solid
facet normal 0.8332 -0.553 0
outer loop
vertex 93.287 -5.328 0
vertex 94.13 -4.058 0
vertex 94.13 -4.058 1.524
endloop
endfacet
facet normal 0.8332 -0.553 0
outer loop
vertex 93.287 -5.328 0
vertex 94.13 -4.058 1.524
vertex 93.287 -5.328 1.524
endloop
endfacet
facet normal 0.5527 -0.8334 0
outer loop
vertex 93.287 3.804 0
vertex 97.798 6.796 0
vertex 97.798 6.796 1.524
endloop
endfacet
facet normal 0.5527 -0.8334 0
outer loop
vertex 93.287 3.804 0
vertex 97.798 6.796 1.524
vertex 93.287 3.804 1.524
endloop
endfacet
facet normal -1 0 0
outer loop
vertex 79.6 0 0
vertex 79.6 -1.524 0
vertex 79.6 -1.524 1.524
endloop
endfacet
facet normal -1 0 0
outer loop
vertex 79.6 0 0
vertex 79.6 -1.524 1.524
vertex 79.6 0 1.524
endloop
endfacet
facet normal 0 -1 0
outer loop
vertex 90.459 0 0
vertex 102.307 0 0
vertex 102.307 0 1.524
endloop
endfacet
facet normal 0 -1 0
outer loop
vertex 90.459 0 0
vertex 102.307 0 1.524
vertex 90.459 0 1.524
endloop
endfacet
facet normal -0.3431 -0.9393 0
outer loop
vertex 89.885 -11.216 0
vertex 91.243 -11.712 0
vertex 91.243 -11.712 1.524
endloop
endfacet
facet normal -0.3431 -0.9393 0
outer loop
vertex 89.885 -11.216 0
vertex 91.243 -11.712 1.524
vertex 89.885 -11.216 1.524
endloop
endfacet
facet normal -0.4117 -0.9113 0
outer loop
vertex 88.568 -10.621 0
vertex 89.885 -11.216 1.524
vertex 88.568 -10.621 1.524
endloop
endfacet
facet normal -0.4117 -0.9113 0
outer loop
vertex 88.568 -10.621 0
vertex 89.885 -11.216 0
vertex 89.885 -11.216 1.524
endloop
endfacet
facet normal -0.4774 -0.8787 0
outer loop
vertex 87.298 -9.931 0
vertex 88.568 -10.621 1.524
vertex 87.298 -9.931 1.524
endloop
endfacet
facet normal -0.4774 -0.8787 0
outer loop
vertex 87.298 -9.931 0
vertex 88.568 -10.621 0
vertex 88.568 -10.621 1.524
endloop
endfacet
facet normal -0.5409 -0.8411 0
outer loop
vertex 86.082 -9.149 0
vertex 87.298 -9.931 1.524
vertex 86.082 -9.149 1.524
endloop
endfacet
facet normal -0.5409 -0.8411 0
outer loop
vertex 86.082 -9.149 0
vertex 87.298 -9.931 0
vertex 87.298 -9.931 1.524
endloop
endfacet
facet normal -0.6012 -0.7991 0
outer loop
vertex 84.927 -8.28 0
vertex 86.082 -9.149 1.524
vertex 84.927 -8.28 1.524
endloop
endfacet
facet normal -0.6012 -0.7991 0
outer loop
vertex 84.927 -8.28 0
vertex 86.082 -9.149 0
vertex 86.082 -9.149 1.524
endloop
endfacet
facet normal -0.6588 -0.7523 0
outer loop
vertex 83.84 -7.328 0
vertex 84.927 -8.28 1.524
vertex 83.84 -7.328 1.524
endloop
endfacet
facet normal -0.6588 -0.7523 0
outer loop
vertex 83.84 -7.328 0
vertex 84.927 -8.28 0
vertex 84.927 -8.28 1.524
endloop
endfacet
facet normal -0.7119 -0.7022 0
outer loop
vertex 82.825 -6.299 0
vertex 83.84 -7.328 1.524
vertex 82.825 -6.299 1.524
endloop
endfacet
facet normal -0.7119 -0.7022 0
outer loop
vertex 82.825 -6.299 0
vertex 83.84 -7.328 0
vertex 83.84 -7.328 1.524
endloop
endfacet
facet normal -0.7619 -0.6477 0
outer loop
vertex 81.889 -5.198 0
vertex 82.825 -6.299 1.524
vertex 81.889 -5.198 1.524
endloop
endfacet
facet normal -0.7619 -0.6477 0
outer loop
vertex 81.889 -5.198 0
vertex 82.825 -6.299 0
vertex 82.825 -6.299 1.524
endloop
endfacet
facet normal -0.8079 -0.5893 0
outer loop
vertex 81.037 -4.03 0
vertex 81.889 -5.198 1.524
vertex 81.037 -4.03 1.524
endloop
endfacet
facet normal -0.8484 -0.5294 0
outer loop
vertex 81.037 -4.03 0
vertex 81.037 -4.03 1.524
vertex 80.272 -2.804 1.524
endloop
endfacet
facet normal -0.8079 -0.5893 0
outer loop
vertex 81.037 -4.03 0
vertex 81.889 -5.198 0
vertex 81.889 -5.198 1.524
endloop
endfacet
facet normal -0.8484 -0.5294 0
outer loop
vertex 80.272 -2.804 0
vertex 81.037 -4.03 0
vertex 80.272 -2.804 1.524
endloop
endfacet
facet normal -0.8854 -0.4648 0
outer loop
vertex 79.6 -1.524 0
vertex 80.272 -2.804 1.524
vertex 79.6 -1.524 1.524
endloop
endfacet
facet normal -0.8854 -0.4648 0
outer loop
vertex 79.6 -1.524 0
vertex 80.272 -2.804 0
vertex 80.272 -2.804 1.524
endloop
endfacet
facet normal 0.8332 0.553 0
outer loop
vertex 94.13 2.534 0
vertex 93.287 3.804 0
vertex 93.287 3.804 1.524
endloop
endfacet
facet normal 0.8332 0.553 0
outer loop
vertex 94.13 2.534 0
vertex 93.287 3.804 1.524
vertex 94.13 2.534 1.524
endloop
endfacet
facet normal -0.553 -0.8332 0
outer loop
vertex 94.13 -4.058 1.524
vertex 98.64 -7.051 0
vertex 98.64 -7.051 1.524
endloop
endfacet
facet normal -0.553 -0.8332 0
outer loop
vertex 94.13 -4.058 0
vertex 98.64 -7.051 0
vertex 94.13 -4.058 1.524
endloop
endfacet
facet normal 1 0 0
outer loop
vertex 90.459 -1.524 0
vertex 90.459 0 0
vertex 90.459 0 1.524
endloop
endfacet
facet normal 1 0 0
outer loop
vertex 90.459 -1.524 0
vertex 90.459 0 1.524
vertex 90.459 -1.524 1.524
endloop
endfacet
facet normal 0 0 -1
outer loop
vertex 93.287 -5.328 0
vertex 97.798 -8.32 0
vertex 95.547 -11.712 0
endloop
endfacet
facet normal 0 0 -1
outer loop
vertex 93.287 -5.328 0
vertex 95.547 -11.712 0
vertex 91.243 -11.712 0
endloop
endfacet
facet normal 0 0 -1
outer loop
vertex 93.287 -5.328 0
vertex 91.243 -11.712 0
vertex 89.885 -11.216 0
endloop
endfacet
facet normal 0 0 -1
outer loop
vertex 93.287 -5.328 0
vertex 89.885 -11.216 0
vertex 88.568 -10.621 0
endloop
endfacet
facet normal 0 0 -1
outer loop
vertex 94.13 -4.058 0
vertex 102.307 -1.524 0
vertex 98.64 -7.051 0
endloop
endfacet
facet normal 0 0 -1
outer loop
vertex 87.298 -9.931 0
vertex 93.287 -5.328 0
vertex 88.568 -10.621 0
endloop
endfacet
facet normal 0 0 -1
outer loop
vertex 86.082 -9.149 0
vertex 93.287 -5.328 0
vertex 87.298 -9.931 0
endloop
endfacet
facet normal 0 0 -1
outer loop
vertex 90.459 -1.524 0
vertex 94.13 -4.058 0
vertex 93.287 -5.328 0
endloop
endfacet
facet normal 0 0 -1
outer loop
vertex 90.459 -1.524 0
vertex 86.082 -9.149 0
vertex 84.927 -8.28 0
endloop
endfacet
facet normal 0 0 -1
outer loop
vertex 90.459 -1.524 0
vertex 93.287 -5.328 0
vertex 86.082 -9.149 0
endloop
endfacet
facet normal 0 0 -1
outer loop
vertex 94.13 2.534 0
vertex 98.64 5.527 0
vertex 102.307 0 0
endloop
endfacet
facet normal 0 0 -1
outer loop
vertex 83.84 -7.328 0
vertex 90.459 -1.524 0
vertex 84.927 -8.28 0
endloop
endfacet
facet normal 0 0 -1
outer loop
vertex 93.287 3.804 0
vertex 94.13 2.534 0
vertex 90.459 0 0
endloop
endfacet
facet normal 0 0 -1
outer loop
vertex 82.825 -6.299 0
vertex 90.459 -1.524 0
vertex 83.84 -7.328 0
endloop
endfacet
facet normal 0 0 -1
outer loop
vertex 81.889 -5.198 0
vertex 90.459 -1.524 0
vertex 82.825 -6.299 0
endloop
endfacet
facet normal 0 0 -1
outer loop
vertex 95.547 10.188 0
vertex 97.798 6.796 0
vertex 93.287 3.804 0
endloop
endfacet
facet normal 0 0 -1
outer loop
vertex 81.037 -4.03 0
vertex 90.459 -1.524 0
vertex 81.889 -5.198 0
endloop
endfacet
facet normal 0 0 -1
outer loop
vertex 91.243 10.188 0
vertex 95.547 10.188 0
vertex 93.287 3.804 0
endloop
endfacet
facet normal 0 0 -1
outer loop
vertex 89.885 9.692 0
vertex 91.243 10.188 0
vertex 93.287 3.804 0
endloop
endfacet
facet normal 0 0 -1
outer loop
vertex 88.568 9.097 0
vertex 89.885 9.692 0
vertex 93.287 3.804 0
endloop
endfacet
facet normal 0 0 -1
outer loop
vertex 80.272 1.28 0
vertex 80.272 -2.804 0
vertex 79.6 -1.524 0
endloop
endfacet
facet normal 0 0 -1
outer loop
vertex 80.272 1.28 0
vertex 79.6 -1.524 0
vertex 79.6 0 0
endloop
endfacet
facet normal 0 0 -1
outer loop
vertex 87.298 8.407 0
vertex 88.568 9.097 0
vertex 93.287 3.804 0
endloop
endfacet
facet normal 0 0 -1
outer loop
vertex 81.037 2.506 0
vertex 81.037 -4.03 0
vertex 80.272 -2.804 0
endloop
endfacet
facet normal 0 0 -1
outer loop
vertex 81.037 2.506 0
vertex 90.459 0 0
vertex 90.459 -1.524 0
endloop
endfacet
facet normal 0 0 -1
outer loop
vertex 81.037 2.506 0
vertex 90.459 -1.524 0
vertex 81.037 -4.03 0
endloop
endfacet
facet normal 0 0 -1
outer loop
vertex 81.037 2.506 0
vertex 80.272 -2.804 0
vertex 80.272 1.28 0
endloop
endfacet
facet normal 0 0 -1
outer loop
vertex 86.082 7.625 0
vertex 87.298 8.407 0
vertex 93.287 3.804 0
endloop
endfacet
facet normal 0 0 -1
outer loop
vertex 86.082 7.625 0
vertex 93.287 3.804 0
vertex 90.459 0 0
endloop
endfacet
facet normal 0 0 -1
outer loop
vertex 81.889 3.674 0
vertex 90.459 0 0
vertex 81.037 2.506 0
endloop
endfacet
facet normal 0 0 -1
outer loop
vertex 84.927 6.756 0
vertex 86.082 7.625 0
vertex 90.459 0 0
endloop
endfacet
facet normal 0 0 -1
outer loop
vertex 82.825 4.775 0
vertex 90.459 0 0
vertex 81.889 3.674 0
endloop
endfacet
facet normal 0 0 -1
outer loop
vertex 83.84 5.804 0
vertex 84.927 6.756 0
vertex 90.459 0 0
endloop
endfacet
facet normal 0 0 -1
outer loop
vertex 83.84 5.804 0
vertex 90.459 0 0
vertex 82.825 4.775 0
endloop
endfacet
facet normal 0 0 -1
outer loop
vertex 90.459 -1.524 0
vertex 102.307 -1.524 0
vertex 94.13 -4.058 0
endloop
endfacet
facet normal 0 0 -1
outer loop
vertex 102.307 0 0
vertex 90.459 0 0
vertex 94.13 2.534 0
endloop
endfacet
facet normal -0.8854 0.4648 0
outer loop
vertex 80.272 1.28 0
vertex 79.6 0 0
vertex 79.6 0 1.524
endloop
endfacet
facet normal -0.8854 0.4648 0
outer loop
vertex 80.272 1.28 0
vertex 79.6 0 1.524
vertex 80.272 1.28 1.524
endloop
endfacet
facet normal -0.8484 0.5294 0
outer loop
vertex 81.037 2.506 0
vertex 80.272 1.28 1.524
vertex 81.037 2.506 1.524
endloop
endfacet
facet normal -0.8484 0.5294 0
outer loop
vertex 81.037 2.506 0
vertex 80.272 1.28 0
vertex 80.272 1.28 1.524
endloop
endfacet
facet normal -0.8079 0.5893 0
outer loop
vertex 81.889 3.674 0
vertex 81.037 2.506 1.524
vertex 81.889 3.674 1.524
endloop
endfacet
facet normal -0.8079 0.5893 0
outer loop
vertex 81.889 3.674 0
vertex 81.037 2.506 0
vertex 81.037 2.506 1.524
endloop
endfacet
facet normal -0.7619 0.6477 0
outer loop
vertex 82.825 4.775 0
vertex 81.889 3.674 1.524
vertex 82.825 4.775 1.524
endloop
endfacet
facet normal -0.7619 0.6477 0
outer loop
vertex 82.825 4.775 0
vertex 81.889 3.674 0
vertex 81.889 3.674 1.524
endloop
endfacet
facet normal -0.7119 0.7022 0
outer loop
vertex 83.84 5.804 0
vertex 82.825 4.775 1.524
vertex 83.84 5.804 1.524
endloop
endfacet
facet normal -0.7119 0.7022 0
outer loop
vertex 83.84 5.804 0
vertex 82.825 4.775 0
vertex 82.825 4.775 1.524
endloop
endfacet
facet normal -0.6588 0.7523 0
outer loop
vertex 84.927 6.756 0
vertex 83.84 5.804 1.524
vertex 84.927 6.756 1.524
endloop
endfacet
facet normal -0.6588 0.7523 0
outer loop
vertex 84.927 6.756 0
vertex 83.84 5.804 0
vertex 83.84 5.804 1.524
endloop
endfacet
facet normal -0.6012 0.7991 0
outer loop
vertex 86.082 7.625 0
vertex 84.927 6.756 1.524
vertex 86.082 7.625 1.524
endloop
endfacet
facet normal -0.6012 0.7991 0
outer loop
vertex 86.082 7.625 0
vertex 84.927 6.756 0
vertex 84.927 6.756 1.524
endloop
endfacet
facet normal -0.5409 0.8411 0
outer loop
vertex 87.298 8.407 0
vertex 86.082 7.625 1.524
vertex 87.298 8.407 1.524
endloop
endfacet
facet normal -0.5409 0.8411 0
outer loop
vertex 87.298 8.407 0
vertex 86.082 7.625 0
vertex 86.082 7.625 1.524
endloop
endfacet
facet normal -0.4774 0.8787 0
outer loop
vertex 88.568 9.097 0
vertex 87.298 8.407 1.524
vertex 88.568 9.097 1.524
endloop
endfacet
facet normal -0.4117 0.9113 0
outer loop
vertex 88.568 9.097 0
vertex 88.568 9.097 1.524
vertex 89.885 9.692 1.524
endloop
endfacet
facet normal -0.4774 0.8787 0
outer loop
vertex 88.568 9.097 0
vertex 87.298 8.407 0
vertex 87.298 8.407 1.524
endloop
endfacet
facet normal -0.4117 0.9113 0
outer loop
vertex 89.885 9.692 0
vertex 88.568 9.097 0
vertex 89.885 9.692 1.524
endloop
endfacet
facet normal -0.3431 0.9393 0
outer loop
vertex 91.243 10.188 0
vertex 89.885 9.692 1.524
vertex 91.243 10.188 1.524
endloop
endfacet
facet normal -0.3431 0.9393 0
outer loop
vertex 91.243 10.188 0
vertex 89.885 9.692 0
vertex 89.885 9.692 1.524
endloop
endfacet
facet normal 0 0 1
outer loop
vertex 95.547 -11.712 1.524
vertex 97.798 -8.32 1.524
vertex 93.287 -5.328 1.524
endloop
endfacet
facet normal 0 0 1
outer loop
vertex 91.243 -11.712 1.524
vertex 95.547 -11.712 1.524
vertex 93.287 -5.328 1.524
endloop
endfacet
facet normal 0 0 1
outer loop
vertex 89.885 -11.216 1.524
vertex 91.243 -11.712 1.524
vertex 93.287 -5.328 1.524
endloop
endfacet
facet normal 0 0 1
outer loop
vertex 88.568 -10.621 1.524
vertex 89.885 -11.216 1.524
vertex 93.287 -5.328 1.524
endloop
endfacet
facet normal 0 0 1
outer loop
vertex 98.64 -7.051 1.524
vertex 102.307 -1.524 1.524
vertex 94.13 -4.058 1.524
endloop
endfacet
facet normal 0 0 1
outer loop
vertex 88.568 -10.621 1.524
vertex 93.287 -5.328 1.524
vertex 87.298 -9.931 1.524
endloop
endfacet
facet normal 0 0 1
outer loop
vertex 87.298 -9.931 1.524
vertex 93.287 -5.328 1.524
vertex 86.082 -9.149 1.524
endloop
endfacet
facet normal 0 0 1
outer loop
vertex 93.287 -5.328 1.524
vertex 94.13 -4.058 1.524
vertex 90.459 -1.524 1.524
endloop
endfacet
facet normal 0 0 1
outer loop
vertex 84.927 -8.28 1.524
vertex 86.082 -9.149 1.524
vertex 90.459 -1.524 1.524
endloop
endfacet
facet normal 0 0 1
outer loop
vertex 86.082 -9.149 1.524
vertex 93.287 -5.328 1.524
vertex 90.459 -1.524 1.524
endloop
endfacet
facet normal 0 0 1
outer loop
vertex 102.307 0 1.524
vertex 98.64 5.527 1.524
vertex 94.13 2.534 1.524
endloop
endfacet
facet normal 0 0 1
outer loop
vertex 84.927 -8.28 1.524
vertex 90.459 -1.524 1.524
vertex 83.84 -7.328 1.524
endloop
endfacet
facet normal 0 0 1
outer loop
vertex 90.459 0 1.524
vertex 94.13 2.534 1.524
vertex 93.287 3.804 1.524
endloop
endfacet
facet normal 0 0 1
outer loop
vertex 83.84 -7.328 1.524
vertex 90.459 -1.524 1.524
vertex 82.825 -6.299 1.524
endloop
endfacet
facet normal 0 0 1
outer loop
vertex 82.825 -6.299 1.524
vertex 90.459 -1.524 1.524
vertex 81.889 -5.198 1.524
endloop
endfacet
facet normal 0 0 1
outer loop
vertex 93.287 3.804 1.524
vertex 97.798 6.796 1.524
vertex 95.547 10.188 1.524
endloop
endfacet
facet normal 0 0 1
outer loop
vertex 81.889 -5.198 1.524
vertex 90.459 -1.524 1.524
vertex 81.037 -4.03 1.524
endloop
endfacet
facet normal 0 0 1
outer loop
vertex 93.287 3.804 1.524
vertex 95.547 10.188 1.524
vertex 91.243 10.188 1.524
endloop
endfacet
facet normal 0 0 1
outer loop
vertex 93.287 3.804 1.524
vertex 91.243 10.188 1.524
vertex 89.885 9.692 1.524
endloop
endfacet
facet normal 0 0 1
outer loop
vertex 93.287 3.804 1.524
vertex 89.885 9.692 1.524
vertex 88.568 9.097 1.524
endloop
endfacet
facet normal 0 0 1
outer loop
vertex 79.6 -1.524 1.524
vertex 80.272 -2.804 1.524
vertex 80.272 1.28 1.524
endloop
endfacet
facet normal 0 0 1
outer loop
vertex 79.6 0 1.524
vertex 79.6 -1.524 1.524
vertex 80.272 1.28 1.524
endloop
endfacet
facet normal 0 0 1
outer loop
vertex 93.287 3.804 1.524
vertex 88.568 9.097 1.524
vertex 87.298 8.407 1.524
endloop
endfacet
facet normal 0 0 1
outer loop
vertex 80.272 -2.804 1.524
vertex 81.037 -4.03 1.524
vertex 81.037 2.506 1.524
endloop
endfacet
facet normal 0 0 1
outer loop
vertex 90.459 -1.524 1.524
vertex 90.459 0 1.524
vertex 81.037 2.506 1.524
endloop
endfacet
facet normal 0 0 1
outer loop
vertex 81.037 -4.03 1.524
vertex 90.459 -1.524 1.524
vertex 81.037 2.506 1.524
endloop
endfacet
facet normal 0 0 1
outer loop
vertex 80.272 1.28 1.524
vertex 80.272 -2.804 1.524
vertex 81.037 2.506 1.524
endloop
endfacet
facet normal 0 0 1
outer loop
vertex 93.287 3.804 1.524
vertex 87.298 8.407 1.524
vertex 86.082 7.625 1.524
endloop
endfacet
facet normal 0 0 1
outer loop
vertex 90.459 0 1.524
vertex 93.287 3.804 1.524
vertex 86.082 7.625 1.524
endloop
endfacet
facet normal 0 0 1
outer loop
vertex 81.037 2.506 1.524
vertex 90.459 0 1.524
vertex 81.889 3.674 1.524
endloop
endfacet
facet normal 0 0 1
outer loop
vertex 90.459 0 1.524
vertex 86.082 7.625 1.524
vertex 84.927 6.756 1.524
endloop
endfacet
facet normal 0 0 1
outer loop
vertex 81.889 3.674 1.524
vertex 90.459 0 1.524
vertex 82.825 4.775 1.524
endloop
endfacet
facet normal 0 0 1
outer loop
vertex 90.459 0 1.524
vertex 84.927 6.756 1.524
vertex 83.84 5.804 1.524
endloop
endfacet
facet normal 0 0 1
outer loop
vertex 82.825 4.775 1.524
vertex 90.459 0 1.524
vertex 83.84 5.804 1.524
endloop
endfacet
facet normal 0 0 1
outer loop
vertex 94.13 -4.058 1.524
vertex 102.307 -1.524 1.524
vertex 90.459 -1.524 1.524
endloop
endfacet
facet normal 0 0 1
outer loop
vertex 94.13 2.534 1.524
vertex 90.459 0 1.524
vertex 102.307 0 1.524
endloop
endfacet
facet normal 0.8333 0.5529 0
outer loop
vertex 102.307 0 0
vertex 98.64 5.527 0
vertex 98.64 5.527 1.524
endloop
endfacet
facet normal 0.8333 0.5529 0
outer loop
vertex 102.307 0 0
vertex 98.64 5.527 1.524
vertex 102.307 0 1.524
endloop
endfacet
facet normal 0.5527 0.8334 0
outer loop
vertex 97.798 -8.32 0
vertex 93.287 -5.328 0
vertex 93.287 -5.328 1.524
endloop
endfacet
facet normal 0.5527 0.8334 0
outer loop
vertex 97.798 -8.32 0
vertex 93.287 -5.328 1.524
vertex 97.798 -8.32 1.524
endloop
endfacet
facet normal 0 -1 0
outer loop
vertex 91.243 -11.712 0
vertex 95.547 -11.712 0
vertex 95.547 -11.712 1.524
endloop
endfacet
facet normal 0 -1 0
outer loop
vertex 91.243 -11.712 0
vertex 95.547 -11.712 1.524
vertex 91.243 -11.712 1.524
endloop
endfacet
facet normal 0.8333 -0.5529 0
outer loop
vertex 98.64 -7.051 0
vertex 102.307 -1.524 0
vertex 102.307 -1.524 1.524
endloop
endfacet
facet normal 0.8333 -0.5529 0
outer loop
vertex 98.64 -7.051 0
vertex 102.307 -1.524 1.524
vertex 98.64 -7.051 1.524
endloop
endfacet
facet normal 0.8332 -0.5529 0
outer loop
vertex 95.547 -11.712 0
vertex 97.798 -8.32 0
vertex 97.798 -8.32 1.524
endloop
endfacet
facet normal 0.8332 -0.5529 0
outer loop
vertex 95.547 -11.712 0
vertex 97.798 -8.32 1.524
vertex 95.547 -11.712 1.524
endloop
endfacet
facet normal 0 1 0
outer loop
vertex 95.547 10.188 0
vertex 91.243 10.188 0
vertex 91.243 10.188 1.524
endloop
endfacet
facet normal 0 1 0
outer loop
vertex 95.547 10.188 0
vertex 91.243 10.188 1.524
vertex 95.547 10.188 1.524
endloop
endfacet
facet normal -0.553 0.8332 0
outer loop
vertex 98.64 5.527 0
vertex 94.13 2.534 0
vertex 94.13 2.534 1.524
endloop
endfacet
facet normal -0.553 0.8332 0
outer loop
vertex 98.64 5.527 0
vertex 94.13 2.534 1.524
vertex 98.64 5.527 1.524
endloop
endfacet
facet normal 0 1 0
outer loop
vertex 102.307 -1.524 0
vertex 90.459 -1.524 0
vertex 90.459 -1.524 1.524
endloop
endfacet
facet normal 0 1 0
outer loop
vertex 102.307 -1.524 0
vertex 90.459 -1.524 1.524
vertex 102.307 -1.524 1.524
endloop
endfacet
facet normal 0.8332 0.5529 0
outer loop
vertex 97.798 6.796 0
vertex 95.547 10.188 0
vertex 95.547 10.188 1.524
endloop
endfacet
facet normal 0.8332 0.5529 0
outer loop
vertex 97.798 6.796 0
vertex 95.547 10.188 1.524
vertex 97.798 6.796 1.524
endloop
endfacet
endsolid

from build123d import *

# Parameters (mm, degrees)
BOSS_EXTRUDE1_DEPTH = 1.524


with BuildPart() as part:
    # Sketch1 → Boss-Extrude1 (new body)
    with BuildSketch(Plane.XY):
        with BuildLine():
            Line((90.459222019, -1.524), (102.307099067, -1.524))
            Line((102.307099067, -1.524), (98.640274248, -7.050584921))
            Line((98.640274248, -7.050584921), (94.129691871, -4.057865973))
            Line((94.129691871, -4.057865973), (93.28712507, -5.327770374))
            Line((93.28712507, -5.327770374), (97.797707447, -8.320489321))
            Line((97.797707447, -8.320489321), (95.547284868, -11.712293431))
            Line((95.547284868, -11.712293431), (91.242630209, -11.712293431))
            ThreePointArc((91.242630209, -11.712293431), (84.374873322, -7.81416263), (79.600424402, -1.524))
            Line((79.600424402, -1.524), (79.600424402, 0))
            ThreePointArc((79.600424402, 0), (84.374873322, 6.29016263), (91.242630209, 10.188293431))
            Line((91.242630209, 10.188293431), (95.547284868, 10.188293431))
            Line((95.547284868, 10.188293431), (97.797707447, 6.796489321))
            Line((97.797707447, 6.796489321), (93.28712507, 3.803770374))
            Line((93.28712507, 3.803770374), (94.129691871, 2.533865973))
            Line((94.129691871, 2.533865973), (98.640274248, 5.526584921))
            Line((98.640274248, 5.526584921), (102.307099067, 0))
            Line((102.307099067, 0), (90.459222019, 0))
            Line((90.459222019, 0), (90.459222019, -1.524))
        make_face()
    extrude(amount=BOSS_EXTRUDE1_DEPTH)


solid = part.part
